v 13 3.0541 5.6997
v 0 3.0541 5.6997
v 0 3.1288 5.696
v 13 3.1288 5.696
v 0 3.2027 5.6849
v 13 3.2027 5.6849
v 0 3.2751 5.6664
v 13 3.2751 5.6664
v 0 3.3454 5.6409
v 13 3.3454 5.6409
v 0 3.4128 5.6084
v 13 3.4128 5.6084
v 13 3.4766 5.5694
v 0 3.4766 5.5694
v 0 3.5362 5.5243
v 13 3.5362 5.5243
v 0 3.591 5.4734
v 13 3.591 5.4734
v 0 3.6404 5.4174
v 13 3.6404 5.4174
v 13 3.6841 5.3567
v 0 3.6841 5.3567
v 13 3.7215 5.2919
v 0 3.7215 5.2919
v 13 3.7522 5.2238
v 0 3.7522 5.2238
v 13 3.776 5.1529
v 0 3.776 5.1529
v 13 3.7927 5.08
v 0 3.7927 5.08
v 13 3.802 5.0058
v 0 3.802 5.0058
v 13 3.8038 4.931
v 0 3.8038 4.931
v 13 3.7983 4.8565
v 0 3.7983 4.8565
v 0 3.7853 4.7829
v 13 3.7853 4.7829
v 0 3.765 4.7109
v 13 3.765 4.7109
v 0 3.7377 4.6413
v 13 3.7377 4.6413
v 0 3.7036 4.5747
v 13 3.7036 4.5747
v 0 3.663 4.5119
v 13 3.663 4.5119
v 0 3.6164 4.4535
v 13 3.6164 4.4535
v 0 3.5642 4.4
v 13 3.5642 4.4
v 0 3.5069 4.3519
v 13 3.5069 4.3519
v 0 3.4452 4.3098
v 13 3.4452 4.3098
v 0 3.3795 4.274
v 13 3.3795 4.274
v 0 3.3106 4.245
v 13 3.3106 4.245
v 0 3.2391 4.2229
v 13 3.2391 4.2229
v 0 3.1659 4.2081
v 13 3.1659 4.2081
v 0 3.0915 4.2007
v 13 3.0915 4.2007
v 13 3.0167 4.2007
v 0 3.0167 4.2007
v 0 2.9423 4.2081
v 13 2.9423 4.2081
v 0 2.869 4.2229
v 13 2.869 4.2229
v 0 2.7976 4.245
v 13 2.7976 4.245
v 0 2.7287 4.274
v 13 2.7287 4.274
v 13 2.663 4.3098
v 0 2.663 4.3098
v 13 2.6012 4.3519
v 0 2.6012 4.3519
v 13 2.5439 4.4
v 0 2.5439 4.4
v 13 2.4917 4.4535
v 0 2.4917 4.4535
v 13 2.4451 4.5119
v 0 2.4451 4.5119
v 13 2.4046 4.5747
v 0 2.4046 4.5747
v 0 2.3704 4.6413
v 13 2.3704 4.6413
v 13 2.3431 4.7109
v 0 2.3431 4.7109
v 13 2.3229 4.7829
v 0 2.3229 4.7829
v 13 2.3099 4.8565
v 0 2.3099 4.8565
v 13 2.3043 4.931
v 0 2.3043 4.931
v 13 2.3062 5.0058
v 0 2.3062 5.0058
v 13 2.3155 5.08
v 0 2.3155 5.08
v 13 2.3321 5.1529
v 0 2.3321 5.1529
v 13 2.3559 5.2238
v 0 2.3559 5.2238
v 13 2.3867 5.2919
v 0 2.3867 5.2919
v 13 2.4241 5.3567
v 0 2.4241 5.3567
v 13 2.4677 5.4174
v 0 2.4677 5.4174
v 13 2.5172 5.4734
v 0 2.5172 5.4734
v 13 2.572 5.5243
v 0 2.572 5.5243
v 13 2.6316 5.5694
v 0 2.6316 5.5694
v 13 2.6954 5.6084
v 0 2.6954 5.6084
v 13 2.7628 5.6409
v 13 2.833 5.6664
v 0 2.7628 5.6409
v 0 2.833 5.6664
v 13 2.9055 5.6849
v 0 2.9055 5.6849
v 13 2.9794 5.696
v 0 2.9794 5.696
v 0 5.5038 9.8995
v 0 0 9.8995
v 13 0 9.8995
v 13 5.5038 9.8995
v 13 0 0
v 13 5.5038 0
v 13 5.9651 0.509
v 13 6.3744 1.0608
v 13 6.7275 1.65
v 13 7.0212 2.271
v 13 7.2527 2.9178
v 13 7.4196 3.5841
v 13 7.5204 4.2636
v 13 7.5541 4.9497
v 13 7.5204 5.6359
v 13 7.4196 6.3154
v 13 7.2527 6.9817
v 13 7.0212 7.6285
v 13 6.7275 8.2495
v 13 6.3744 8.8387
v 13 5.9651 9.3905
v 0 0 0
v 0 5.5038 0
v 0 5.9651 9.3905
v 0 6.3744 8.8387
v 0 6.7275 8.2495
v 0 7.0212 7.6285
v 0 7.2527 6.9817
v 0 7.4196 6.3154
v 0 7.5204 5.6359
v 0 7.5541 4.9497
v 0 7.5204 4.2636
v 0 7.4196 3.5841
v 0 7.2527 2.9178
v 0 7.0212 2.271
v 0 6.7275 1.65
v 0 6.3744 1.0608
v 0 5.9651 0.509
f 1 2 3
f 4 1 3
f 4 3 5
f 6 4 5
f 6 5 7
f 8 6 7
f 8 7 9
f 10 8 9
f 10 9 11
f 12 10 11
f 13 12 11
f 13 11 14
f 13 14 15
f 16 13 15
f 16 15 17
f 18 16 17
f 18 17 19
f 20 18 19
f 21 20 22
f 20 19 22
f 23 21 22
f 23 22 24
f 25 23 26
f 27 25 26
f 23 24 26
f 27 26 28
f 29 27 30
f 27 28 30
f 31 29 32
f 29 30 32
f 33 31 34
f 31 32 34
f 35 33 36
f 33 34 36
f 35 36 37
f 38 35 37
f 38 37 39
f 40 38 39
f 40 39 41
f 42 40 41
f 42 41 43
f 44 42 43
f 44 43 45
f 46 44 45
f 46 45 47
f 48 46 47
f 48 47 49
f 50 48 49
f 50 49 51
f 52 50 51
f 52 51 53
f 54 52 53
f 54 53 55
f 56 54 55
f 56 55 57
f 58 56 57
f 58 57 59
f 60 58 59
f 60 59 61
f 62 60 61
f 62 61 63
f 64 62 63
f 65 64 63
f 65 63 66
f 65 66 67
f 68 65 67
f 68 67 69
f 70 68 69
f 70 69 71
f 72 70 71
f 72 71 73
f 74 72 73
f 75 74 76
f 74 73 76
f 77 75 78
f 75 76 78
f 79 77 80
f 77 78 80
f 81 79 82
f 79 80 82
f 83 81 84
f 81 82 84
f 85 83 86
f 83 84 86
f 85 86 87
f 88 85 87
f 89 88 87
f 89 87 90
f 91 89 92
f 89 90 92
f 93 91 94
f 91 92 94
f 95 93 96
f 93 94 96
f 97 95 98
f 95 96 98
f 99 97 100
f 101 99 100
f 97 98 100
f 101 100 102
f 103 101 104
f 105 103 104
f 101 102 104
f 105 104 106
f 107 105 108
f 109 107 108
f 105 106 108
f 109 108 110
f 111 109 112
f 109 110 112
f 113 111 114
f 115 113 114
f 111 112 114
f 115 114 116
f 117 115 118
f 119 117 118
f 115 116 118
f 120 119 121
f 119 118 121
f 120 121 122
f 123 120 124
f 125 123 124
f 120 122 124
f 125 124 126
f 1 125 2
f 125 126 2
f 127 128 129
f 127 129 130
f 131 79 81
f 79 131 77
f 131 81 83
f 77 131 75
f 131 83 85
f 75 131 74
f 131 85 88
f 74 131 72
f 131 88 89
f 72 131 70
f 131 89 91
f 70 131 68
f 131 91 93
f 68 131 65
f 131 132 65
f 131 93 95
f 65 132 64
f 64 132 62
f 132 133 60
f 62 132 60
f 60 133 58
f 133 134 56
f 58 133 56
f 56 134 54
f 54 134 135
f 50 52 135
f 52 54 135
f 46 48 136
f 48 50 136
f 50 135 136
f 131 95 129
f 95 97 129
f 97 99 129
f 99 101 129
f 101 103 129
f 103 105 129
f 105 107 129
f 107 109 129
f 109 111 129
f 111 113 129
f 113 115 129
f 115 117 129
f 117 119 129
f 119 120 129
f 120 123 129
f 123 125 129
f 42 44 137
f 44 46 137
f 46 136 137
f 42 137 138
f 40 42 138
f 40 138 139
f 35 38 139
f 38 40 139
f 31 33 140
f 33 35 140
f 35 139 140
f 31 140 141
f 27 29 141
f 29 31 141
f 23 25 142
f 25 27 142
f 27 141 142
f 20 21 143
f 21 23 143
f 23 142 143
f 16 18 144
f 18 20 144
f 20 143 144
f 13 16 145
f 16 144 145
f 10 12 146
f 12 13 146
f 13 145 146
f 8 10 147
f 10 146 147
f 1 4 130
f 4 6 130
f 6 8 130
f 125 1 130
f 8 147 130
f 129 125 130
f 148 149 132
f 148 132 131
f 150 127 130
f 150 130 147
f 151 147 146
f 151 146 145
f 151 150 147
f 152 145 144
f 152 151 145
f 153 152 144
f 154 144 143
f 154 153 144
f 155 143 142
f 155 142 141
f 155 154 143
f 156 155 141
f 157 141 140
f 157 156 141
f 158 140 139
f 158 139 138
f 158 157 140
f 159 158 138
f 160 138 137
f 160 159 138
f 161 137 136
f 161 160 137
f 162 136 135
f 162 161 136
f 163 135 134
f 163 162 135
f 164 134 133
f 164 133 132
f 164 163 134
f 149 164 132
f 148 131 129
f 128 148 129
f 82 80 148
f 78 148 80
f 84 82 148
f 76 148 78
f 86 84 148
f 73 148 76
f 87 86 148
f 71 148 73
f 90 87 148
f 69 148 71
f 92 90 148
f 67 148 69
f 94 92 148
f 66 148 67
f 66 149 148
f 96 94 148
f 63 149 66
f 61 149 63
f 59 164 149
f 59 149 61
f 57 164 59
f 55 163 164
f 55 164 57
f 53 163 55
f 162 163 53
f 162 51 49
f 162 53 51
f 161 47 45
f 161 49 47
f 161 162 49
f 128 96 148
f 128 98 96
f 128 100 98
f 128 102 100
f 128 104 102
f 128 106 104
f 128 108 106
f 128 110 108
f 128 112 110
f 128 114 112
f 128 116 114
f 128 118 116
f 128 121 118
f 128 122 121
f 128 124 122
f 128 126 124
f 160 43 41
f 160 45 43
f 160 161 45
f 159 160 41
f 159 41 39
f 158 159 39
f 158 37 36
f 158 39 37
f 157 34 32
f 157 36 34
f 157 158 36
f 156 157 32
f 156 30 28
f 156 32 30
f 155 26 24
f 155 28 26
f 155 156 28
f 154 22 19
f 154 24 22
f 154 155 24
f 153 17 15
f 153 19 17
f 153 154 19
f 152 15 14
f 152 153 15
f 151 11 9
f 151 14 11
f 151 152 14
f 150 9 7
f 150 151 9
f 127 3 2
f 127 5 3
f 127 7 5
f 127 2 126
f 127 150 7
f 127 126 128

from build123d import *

# Parameters (mm, degrees)
BOSS_EXTRUDE1_DEPTH   = 13
F_1_5MM_DOWEL_SLOT1_D = 1.5


with BuildPart() as part:
    # Sketch1 → Boss-Extrude1 (new body)
    with BuildSketch(Plane(origin=(0, 0, 0), x_dir=(0, 0, -1), z_dir=(1, 0, 0))):
        with BuildLine():
            Line((0, 0), (-9.899494937, 0))
            Line((-9.899494937, 0), (-9.899494937, 5.503823677))
            ThreePointArc((-9.899494937, 5.503823677), (-4.949747468, 7.554076209), (0, 5.503823677))
            Line((0, 5.503823677), (0, 0))
        make_face()
    extrude(amount=BOSS_EXTRUDE1_DEPTH)

    # Ø1.5mm Dowel Slot1 (through all)
    with Locations(Plane(origin=(13, 0, 0), x_dir=(0, 0, -1), z_dir=(1, 0, 0))):
        with Locations((-4.949747468, 3.054076209)):
            Hole(F_1_5MM_DOWEL_SLOT1_D / 2)


solid = part.part
